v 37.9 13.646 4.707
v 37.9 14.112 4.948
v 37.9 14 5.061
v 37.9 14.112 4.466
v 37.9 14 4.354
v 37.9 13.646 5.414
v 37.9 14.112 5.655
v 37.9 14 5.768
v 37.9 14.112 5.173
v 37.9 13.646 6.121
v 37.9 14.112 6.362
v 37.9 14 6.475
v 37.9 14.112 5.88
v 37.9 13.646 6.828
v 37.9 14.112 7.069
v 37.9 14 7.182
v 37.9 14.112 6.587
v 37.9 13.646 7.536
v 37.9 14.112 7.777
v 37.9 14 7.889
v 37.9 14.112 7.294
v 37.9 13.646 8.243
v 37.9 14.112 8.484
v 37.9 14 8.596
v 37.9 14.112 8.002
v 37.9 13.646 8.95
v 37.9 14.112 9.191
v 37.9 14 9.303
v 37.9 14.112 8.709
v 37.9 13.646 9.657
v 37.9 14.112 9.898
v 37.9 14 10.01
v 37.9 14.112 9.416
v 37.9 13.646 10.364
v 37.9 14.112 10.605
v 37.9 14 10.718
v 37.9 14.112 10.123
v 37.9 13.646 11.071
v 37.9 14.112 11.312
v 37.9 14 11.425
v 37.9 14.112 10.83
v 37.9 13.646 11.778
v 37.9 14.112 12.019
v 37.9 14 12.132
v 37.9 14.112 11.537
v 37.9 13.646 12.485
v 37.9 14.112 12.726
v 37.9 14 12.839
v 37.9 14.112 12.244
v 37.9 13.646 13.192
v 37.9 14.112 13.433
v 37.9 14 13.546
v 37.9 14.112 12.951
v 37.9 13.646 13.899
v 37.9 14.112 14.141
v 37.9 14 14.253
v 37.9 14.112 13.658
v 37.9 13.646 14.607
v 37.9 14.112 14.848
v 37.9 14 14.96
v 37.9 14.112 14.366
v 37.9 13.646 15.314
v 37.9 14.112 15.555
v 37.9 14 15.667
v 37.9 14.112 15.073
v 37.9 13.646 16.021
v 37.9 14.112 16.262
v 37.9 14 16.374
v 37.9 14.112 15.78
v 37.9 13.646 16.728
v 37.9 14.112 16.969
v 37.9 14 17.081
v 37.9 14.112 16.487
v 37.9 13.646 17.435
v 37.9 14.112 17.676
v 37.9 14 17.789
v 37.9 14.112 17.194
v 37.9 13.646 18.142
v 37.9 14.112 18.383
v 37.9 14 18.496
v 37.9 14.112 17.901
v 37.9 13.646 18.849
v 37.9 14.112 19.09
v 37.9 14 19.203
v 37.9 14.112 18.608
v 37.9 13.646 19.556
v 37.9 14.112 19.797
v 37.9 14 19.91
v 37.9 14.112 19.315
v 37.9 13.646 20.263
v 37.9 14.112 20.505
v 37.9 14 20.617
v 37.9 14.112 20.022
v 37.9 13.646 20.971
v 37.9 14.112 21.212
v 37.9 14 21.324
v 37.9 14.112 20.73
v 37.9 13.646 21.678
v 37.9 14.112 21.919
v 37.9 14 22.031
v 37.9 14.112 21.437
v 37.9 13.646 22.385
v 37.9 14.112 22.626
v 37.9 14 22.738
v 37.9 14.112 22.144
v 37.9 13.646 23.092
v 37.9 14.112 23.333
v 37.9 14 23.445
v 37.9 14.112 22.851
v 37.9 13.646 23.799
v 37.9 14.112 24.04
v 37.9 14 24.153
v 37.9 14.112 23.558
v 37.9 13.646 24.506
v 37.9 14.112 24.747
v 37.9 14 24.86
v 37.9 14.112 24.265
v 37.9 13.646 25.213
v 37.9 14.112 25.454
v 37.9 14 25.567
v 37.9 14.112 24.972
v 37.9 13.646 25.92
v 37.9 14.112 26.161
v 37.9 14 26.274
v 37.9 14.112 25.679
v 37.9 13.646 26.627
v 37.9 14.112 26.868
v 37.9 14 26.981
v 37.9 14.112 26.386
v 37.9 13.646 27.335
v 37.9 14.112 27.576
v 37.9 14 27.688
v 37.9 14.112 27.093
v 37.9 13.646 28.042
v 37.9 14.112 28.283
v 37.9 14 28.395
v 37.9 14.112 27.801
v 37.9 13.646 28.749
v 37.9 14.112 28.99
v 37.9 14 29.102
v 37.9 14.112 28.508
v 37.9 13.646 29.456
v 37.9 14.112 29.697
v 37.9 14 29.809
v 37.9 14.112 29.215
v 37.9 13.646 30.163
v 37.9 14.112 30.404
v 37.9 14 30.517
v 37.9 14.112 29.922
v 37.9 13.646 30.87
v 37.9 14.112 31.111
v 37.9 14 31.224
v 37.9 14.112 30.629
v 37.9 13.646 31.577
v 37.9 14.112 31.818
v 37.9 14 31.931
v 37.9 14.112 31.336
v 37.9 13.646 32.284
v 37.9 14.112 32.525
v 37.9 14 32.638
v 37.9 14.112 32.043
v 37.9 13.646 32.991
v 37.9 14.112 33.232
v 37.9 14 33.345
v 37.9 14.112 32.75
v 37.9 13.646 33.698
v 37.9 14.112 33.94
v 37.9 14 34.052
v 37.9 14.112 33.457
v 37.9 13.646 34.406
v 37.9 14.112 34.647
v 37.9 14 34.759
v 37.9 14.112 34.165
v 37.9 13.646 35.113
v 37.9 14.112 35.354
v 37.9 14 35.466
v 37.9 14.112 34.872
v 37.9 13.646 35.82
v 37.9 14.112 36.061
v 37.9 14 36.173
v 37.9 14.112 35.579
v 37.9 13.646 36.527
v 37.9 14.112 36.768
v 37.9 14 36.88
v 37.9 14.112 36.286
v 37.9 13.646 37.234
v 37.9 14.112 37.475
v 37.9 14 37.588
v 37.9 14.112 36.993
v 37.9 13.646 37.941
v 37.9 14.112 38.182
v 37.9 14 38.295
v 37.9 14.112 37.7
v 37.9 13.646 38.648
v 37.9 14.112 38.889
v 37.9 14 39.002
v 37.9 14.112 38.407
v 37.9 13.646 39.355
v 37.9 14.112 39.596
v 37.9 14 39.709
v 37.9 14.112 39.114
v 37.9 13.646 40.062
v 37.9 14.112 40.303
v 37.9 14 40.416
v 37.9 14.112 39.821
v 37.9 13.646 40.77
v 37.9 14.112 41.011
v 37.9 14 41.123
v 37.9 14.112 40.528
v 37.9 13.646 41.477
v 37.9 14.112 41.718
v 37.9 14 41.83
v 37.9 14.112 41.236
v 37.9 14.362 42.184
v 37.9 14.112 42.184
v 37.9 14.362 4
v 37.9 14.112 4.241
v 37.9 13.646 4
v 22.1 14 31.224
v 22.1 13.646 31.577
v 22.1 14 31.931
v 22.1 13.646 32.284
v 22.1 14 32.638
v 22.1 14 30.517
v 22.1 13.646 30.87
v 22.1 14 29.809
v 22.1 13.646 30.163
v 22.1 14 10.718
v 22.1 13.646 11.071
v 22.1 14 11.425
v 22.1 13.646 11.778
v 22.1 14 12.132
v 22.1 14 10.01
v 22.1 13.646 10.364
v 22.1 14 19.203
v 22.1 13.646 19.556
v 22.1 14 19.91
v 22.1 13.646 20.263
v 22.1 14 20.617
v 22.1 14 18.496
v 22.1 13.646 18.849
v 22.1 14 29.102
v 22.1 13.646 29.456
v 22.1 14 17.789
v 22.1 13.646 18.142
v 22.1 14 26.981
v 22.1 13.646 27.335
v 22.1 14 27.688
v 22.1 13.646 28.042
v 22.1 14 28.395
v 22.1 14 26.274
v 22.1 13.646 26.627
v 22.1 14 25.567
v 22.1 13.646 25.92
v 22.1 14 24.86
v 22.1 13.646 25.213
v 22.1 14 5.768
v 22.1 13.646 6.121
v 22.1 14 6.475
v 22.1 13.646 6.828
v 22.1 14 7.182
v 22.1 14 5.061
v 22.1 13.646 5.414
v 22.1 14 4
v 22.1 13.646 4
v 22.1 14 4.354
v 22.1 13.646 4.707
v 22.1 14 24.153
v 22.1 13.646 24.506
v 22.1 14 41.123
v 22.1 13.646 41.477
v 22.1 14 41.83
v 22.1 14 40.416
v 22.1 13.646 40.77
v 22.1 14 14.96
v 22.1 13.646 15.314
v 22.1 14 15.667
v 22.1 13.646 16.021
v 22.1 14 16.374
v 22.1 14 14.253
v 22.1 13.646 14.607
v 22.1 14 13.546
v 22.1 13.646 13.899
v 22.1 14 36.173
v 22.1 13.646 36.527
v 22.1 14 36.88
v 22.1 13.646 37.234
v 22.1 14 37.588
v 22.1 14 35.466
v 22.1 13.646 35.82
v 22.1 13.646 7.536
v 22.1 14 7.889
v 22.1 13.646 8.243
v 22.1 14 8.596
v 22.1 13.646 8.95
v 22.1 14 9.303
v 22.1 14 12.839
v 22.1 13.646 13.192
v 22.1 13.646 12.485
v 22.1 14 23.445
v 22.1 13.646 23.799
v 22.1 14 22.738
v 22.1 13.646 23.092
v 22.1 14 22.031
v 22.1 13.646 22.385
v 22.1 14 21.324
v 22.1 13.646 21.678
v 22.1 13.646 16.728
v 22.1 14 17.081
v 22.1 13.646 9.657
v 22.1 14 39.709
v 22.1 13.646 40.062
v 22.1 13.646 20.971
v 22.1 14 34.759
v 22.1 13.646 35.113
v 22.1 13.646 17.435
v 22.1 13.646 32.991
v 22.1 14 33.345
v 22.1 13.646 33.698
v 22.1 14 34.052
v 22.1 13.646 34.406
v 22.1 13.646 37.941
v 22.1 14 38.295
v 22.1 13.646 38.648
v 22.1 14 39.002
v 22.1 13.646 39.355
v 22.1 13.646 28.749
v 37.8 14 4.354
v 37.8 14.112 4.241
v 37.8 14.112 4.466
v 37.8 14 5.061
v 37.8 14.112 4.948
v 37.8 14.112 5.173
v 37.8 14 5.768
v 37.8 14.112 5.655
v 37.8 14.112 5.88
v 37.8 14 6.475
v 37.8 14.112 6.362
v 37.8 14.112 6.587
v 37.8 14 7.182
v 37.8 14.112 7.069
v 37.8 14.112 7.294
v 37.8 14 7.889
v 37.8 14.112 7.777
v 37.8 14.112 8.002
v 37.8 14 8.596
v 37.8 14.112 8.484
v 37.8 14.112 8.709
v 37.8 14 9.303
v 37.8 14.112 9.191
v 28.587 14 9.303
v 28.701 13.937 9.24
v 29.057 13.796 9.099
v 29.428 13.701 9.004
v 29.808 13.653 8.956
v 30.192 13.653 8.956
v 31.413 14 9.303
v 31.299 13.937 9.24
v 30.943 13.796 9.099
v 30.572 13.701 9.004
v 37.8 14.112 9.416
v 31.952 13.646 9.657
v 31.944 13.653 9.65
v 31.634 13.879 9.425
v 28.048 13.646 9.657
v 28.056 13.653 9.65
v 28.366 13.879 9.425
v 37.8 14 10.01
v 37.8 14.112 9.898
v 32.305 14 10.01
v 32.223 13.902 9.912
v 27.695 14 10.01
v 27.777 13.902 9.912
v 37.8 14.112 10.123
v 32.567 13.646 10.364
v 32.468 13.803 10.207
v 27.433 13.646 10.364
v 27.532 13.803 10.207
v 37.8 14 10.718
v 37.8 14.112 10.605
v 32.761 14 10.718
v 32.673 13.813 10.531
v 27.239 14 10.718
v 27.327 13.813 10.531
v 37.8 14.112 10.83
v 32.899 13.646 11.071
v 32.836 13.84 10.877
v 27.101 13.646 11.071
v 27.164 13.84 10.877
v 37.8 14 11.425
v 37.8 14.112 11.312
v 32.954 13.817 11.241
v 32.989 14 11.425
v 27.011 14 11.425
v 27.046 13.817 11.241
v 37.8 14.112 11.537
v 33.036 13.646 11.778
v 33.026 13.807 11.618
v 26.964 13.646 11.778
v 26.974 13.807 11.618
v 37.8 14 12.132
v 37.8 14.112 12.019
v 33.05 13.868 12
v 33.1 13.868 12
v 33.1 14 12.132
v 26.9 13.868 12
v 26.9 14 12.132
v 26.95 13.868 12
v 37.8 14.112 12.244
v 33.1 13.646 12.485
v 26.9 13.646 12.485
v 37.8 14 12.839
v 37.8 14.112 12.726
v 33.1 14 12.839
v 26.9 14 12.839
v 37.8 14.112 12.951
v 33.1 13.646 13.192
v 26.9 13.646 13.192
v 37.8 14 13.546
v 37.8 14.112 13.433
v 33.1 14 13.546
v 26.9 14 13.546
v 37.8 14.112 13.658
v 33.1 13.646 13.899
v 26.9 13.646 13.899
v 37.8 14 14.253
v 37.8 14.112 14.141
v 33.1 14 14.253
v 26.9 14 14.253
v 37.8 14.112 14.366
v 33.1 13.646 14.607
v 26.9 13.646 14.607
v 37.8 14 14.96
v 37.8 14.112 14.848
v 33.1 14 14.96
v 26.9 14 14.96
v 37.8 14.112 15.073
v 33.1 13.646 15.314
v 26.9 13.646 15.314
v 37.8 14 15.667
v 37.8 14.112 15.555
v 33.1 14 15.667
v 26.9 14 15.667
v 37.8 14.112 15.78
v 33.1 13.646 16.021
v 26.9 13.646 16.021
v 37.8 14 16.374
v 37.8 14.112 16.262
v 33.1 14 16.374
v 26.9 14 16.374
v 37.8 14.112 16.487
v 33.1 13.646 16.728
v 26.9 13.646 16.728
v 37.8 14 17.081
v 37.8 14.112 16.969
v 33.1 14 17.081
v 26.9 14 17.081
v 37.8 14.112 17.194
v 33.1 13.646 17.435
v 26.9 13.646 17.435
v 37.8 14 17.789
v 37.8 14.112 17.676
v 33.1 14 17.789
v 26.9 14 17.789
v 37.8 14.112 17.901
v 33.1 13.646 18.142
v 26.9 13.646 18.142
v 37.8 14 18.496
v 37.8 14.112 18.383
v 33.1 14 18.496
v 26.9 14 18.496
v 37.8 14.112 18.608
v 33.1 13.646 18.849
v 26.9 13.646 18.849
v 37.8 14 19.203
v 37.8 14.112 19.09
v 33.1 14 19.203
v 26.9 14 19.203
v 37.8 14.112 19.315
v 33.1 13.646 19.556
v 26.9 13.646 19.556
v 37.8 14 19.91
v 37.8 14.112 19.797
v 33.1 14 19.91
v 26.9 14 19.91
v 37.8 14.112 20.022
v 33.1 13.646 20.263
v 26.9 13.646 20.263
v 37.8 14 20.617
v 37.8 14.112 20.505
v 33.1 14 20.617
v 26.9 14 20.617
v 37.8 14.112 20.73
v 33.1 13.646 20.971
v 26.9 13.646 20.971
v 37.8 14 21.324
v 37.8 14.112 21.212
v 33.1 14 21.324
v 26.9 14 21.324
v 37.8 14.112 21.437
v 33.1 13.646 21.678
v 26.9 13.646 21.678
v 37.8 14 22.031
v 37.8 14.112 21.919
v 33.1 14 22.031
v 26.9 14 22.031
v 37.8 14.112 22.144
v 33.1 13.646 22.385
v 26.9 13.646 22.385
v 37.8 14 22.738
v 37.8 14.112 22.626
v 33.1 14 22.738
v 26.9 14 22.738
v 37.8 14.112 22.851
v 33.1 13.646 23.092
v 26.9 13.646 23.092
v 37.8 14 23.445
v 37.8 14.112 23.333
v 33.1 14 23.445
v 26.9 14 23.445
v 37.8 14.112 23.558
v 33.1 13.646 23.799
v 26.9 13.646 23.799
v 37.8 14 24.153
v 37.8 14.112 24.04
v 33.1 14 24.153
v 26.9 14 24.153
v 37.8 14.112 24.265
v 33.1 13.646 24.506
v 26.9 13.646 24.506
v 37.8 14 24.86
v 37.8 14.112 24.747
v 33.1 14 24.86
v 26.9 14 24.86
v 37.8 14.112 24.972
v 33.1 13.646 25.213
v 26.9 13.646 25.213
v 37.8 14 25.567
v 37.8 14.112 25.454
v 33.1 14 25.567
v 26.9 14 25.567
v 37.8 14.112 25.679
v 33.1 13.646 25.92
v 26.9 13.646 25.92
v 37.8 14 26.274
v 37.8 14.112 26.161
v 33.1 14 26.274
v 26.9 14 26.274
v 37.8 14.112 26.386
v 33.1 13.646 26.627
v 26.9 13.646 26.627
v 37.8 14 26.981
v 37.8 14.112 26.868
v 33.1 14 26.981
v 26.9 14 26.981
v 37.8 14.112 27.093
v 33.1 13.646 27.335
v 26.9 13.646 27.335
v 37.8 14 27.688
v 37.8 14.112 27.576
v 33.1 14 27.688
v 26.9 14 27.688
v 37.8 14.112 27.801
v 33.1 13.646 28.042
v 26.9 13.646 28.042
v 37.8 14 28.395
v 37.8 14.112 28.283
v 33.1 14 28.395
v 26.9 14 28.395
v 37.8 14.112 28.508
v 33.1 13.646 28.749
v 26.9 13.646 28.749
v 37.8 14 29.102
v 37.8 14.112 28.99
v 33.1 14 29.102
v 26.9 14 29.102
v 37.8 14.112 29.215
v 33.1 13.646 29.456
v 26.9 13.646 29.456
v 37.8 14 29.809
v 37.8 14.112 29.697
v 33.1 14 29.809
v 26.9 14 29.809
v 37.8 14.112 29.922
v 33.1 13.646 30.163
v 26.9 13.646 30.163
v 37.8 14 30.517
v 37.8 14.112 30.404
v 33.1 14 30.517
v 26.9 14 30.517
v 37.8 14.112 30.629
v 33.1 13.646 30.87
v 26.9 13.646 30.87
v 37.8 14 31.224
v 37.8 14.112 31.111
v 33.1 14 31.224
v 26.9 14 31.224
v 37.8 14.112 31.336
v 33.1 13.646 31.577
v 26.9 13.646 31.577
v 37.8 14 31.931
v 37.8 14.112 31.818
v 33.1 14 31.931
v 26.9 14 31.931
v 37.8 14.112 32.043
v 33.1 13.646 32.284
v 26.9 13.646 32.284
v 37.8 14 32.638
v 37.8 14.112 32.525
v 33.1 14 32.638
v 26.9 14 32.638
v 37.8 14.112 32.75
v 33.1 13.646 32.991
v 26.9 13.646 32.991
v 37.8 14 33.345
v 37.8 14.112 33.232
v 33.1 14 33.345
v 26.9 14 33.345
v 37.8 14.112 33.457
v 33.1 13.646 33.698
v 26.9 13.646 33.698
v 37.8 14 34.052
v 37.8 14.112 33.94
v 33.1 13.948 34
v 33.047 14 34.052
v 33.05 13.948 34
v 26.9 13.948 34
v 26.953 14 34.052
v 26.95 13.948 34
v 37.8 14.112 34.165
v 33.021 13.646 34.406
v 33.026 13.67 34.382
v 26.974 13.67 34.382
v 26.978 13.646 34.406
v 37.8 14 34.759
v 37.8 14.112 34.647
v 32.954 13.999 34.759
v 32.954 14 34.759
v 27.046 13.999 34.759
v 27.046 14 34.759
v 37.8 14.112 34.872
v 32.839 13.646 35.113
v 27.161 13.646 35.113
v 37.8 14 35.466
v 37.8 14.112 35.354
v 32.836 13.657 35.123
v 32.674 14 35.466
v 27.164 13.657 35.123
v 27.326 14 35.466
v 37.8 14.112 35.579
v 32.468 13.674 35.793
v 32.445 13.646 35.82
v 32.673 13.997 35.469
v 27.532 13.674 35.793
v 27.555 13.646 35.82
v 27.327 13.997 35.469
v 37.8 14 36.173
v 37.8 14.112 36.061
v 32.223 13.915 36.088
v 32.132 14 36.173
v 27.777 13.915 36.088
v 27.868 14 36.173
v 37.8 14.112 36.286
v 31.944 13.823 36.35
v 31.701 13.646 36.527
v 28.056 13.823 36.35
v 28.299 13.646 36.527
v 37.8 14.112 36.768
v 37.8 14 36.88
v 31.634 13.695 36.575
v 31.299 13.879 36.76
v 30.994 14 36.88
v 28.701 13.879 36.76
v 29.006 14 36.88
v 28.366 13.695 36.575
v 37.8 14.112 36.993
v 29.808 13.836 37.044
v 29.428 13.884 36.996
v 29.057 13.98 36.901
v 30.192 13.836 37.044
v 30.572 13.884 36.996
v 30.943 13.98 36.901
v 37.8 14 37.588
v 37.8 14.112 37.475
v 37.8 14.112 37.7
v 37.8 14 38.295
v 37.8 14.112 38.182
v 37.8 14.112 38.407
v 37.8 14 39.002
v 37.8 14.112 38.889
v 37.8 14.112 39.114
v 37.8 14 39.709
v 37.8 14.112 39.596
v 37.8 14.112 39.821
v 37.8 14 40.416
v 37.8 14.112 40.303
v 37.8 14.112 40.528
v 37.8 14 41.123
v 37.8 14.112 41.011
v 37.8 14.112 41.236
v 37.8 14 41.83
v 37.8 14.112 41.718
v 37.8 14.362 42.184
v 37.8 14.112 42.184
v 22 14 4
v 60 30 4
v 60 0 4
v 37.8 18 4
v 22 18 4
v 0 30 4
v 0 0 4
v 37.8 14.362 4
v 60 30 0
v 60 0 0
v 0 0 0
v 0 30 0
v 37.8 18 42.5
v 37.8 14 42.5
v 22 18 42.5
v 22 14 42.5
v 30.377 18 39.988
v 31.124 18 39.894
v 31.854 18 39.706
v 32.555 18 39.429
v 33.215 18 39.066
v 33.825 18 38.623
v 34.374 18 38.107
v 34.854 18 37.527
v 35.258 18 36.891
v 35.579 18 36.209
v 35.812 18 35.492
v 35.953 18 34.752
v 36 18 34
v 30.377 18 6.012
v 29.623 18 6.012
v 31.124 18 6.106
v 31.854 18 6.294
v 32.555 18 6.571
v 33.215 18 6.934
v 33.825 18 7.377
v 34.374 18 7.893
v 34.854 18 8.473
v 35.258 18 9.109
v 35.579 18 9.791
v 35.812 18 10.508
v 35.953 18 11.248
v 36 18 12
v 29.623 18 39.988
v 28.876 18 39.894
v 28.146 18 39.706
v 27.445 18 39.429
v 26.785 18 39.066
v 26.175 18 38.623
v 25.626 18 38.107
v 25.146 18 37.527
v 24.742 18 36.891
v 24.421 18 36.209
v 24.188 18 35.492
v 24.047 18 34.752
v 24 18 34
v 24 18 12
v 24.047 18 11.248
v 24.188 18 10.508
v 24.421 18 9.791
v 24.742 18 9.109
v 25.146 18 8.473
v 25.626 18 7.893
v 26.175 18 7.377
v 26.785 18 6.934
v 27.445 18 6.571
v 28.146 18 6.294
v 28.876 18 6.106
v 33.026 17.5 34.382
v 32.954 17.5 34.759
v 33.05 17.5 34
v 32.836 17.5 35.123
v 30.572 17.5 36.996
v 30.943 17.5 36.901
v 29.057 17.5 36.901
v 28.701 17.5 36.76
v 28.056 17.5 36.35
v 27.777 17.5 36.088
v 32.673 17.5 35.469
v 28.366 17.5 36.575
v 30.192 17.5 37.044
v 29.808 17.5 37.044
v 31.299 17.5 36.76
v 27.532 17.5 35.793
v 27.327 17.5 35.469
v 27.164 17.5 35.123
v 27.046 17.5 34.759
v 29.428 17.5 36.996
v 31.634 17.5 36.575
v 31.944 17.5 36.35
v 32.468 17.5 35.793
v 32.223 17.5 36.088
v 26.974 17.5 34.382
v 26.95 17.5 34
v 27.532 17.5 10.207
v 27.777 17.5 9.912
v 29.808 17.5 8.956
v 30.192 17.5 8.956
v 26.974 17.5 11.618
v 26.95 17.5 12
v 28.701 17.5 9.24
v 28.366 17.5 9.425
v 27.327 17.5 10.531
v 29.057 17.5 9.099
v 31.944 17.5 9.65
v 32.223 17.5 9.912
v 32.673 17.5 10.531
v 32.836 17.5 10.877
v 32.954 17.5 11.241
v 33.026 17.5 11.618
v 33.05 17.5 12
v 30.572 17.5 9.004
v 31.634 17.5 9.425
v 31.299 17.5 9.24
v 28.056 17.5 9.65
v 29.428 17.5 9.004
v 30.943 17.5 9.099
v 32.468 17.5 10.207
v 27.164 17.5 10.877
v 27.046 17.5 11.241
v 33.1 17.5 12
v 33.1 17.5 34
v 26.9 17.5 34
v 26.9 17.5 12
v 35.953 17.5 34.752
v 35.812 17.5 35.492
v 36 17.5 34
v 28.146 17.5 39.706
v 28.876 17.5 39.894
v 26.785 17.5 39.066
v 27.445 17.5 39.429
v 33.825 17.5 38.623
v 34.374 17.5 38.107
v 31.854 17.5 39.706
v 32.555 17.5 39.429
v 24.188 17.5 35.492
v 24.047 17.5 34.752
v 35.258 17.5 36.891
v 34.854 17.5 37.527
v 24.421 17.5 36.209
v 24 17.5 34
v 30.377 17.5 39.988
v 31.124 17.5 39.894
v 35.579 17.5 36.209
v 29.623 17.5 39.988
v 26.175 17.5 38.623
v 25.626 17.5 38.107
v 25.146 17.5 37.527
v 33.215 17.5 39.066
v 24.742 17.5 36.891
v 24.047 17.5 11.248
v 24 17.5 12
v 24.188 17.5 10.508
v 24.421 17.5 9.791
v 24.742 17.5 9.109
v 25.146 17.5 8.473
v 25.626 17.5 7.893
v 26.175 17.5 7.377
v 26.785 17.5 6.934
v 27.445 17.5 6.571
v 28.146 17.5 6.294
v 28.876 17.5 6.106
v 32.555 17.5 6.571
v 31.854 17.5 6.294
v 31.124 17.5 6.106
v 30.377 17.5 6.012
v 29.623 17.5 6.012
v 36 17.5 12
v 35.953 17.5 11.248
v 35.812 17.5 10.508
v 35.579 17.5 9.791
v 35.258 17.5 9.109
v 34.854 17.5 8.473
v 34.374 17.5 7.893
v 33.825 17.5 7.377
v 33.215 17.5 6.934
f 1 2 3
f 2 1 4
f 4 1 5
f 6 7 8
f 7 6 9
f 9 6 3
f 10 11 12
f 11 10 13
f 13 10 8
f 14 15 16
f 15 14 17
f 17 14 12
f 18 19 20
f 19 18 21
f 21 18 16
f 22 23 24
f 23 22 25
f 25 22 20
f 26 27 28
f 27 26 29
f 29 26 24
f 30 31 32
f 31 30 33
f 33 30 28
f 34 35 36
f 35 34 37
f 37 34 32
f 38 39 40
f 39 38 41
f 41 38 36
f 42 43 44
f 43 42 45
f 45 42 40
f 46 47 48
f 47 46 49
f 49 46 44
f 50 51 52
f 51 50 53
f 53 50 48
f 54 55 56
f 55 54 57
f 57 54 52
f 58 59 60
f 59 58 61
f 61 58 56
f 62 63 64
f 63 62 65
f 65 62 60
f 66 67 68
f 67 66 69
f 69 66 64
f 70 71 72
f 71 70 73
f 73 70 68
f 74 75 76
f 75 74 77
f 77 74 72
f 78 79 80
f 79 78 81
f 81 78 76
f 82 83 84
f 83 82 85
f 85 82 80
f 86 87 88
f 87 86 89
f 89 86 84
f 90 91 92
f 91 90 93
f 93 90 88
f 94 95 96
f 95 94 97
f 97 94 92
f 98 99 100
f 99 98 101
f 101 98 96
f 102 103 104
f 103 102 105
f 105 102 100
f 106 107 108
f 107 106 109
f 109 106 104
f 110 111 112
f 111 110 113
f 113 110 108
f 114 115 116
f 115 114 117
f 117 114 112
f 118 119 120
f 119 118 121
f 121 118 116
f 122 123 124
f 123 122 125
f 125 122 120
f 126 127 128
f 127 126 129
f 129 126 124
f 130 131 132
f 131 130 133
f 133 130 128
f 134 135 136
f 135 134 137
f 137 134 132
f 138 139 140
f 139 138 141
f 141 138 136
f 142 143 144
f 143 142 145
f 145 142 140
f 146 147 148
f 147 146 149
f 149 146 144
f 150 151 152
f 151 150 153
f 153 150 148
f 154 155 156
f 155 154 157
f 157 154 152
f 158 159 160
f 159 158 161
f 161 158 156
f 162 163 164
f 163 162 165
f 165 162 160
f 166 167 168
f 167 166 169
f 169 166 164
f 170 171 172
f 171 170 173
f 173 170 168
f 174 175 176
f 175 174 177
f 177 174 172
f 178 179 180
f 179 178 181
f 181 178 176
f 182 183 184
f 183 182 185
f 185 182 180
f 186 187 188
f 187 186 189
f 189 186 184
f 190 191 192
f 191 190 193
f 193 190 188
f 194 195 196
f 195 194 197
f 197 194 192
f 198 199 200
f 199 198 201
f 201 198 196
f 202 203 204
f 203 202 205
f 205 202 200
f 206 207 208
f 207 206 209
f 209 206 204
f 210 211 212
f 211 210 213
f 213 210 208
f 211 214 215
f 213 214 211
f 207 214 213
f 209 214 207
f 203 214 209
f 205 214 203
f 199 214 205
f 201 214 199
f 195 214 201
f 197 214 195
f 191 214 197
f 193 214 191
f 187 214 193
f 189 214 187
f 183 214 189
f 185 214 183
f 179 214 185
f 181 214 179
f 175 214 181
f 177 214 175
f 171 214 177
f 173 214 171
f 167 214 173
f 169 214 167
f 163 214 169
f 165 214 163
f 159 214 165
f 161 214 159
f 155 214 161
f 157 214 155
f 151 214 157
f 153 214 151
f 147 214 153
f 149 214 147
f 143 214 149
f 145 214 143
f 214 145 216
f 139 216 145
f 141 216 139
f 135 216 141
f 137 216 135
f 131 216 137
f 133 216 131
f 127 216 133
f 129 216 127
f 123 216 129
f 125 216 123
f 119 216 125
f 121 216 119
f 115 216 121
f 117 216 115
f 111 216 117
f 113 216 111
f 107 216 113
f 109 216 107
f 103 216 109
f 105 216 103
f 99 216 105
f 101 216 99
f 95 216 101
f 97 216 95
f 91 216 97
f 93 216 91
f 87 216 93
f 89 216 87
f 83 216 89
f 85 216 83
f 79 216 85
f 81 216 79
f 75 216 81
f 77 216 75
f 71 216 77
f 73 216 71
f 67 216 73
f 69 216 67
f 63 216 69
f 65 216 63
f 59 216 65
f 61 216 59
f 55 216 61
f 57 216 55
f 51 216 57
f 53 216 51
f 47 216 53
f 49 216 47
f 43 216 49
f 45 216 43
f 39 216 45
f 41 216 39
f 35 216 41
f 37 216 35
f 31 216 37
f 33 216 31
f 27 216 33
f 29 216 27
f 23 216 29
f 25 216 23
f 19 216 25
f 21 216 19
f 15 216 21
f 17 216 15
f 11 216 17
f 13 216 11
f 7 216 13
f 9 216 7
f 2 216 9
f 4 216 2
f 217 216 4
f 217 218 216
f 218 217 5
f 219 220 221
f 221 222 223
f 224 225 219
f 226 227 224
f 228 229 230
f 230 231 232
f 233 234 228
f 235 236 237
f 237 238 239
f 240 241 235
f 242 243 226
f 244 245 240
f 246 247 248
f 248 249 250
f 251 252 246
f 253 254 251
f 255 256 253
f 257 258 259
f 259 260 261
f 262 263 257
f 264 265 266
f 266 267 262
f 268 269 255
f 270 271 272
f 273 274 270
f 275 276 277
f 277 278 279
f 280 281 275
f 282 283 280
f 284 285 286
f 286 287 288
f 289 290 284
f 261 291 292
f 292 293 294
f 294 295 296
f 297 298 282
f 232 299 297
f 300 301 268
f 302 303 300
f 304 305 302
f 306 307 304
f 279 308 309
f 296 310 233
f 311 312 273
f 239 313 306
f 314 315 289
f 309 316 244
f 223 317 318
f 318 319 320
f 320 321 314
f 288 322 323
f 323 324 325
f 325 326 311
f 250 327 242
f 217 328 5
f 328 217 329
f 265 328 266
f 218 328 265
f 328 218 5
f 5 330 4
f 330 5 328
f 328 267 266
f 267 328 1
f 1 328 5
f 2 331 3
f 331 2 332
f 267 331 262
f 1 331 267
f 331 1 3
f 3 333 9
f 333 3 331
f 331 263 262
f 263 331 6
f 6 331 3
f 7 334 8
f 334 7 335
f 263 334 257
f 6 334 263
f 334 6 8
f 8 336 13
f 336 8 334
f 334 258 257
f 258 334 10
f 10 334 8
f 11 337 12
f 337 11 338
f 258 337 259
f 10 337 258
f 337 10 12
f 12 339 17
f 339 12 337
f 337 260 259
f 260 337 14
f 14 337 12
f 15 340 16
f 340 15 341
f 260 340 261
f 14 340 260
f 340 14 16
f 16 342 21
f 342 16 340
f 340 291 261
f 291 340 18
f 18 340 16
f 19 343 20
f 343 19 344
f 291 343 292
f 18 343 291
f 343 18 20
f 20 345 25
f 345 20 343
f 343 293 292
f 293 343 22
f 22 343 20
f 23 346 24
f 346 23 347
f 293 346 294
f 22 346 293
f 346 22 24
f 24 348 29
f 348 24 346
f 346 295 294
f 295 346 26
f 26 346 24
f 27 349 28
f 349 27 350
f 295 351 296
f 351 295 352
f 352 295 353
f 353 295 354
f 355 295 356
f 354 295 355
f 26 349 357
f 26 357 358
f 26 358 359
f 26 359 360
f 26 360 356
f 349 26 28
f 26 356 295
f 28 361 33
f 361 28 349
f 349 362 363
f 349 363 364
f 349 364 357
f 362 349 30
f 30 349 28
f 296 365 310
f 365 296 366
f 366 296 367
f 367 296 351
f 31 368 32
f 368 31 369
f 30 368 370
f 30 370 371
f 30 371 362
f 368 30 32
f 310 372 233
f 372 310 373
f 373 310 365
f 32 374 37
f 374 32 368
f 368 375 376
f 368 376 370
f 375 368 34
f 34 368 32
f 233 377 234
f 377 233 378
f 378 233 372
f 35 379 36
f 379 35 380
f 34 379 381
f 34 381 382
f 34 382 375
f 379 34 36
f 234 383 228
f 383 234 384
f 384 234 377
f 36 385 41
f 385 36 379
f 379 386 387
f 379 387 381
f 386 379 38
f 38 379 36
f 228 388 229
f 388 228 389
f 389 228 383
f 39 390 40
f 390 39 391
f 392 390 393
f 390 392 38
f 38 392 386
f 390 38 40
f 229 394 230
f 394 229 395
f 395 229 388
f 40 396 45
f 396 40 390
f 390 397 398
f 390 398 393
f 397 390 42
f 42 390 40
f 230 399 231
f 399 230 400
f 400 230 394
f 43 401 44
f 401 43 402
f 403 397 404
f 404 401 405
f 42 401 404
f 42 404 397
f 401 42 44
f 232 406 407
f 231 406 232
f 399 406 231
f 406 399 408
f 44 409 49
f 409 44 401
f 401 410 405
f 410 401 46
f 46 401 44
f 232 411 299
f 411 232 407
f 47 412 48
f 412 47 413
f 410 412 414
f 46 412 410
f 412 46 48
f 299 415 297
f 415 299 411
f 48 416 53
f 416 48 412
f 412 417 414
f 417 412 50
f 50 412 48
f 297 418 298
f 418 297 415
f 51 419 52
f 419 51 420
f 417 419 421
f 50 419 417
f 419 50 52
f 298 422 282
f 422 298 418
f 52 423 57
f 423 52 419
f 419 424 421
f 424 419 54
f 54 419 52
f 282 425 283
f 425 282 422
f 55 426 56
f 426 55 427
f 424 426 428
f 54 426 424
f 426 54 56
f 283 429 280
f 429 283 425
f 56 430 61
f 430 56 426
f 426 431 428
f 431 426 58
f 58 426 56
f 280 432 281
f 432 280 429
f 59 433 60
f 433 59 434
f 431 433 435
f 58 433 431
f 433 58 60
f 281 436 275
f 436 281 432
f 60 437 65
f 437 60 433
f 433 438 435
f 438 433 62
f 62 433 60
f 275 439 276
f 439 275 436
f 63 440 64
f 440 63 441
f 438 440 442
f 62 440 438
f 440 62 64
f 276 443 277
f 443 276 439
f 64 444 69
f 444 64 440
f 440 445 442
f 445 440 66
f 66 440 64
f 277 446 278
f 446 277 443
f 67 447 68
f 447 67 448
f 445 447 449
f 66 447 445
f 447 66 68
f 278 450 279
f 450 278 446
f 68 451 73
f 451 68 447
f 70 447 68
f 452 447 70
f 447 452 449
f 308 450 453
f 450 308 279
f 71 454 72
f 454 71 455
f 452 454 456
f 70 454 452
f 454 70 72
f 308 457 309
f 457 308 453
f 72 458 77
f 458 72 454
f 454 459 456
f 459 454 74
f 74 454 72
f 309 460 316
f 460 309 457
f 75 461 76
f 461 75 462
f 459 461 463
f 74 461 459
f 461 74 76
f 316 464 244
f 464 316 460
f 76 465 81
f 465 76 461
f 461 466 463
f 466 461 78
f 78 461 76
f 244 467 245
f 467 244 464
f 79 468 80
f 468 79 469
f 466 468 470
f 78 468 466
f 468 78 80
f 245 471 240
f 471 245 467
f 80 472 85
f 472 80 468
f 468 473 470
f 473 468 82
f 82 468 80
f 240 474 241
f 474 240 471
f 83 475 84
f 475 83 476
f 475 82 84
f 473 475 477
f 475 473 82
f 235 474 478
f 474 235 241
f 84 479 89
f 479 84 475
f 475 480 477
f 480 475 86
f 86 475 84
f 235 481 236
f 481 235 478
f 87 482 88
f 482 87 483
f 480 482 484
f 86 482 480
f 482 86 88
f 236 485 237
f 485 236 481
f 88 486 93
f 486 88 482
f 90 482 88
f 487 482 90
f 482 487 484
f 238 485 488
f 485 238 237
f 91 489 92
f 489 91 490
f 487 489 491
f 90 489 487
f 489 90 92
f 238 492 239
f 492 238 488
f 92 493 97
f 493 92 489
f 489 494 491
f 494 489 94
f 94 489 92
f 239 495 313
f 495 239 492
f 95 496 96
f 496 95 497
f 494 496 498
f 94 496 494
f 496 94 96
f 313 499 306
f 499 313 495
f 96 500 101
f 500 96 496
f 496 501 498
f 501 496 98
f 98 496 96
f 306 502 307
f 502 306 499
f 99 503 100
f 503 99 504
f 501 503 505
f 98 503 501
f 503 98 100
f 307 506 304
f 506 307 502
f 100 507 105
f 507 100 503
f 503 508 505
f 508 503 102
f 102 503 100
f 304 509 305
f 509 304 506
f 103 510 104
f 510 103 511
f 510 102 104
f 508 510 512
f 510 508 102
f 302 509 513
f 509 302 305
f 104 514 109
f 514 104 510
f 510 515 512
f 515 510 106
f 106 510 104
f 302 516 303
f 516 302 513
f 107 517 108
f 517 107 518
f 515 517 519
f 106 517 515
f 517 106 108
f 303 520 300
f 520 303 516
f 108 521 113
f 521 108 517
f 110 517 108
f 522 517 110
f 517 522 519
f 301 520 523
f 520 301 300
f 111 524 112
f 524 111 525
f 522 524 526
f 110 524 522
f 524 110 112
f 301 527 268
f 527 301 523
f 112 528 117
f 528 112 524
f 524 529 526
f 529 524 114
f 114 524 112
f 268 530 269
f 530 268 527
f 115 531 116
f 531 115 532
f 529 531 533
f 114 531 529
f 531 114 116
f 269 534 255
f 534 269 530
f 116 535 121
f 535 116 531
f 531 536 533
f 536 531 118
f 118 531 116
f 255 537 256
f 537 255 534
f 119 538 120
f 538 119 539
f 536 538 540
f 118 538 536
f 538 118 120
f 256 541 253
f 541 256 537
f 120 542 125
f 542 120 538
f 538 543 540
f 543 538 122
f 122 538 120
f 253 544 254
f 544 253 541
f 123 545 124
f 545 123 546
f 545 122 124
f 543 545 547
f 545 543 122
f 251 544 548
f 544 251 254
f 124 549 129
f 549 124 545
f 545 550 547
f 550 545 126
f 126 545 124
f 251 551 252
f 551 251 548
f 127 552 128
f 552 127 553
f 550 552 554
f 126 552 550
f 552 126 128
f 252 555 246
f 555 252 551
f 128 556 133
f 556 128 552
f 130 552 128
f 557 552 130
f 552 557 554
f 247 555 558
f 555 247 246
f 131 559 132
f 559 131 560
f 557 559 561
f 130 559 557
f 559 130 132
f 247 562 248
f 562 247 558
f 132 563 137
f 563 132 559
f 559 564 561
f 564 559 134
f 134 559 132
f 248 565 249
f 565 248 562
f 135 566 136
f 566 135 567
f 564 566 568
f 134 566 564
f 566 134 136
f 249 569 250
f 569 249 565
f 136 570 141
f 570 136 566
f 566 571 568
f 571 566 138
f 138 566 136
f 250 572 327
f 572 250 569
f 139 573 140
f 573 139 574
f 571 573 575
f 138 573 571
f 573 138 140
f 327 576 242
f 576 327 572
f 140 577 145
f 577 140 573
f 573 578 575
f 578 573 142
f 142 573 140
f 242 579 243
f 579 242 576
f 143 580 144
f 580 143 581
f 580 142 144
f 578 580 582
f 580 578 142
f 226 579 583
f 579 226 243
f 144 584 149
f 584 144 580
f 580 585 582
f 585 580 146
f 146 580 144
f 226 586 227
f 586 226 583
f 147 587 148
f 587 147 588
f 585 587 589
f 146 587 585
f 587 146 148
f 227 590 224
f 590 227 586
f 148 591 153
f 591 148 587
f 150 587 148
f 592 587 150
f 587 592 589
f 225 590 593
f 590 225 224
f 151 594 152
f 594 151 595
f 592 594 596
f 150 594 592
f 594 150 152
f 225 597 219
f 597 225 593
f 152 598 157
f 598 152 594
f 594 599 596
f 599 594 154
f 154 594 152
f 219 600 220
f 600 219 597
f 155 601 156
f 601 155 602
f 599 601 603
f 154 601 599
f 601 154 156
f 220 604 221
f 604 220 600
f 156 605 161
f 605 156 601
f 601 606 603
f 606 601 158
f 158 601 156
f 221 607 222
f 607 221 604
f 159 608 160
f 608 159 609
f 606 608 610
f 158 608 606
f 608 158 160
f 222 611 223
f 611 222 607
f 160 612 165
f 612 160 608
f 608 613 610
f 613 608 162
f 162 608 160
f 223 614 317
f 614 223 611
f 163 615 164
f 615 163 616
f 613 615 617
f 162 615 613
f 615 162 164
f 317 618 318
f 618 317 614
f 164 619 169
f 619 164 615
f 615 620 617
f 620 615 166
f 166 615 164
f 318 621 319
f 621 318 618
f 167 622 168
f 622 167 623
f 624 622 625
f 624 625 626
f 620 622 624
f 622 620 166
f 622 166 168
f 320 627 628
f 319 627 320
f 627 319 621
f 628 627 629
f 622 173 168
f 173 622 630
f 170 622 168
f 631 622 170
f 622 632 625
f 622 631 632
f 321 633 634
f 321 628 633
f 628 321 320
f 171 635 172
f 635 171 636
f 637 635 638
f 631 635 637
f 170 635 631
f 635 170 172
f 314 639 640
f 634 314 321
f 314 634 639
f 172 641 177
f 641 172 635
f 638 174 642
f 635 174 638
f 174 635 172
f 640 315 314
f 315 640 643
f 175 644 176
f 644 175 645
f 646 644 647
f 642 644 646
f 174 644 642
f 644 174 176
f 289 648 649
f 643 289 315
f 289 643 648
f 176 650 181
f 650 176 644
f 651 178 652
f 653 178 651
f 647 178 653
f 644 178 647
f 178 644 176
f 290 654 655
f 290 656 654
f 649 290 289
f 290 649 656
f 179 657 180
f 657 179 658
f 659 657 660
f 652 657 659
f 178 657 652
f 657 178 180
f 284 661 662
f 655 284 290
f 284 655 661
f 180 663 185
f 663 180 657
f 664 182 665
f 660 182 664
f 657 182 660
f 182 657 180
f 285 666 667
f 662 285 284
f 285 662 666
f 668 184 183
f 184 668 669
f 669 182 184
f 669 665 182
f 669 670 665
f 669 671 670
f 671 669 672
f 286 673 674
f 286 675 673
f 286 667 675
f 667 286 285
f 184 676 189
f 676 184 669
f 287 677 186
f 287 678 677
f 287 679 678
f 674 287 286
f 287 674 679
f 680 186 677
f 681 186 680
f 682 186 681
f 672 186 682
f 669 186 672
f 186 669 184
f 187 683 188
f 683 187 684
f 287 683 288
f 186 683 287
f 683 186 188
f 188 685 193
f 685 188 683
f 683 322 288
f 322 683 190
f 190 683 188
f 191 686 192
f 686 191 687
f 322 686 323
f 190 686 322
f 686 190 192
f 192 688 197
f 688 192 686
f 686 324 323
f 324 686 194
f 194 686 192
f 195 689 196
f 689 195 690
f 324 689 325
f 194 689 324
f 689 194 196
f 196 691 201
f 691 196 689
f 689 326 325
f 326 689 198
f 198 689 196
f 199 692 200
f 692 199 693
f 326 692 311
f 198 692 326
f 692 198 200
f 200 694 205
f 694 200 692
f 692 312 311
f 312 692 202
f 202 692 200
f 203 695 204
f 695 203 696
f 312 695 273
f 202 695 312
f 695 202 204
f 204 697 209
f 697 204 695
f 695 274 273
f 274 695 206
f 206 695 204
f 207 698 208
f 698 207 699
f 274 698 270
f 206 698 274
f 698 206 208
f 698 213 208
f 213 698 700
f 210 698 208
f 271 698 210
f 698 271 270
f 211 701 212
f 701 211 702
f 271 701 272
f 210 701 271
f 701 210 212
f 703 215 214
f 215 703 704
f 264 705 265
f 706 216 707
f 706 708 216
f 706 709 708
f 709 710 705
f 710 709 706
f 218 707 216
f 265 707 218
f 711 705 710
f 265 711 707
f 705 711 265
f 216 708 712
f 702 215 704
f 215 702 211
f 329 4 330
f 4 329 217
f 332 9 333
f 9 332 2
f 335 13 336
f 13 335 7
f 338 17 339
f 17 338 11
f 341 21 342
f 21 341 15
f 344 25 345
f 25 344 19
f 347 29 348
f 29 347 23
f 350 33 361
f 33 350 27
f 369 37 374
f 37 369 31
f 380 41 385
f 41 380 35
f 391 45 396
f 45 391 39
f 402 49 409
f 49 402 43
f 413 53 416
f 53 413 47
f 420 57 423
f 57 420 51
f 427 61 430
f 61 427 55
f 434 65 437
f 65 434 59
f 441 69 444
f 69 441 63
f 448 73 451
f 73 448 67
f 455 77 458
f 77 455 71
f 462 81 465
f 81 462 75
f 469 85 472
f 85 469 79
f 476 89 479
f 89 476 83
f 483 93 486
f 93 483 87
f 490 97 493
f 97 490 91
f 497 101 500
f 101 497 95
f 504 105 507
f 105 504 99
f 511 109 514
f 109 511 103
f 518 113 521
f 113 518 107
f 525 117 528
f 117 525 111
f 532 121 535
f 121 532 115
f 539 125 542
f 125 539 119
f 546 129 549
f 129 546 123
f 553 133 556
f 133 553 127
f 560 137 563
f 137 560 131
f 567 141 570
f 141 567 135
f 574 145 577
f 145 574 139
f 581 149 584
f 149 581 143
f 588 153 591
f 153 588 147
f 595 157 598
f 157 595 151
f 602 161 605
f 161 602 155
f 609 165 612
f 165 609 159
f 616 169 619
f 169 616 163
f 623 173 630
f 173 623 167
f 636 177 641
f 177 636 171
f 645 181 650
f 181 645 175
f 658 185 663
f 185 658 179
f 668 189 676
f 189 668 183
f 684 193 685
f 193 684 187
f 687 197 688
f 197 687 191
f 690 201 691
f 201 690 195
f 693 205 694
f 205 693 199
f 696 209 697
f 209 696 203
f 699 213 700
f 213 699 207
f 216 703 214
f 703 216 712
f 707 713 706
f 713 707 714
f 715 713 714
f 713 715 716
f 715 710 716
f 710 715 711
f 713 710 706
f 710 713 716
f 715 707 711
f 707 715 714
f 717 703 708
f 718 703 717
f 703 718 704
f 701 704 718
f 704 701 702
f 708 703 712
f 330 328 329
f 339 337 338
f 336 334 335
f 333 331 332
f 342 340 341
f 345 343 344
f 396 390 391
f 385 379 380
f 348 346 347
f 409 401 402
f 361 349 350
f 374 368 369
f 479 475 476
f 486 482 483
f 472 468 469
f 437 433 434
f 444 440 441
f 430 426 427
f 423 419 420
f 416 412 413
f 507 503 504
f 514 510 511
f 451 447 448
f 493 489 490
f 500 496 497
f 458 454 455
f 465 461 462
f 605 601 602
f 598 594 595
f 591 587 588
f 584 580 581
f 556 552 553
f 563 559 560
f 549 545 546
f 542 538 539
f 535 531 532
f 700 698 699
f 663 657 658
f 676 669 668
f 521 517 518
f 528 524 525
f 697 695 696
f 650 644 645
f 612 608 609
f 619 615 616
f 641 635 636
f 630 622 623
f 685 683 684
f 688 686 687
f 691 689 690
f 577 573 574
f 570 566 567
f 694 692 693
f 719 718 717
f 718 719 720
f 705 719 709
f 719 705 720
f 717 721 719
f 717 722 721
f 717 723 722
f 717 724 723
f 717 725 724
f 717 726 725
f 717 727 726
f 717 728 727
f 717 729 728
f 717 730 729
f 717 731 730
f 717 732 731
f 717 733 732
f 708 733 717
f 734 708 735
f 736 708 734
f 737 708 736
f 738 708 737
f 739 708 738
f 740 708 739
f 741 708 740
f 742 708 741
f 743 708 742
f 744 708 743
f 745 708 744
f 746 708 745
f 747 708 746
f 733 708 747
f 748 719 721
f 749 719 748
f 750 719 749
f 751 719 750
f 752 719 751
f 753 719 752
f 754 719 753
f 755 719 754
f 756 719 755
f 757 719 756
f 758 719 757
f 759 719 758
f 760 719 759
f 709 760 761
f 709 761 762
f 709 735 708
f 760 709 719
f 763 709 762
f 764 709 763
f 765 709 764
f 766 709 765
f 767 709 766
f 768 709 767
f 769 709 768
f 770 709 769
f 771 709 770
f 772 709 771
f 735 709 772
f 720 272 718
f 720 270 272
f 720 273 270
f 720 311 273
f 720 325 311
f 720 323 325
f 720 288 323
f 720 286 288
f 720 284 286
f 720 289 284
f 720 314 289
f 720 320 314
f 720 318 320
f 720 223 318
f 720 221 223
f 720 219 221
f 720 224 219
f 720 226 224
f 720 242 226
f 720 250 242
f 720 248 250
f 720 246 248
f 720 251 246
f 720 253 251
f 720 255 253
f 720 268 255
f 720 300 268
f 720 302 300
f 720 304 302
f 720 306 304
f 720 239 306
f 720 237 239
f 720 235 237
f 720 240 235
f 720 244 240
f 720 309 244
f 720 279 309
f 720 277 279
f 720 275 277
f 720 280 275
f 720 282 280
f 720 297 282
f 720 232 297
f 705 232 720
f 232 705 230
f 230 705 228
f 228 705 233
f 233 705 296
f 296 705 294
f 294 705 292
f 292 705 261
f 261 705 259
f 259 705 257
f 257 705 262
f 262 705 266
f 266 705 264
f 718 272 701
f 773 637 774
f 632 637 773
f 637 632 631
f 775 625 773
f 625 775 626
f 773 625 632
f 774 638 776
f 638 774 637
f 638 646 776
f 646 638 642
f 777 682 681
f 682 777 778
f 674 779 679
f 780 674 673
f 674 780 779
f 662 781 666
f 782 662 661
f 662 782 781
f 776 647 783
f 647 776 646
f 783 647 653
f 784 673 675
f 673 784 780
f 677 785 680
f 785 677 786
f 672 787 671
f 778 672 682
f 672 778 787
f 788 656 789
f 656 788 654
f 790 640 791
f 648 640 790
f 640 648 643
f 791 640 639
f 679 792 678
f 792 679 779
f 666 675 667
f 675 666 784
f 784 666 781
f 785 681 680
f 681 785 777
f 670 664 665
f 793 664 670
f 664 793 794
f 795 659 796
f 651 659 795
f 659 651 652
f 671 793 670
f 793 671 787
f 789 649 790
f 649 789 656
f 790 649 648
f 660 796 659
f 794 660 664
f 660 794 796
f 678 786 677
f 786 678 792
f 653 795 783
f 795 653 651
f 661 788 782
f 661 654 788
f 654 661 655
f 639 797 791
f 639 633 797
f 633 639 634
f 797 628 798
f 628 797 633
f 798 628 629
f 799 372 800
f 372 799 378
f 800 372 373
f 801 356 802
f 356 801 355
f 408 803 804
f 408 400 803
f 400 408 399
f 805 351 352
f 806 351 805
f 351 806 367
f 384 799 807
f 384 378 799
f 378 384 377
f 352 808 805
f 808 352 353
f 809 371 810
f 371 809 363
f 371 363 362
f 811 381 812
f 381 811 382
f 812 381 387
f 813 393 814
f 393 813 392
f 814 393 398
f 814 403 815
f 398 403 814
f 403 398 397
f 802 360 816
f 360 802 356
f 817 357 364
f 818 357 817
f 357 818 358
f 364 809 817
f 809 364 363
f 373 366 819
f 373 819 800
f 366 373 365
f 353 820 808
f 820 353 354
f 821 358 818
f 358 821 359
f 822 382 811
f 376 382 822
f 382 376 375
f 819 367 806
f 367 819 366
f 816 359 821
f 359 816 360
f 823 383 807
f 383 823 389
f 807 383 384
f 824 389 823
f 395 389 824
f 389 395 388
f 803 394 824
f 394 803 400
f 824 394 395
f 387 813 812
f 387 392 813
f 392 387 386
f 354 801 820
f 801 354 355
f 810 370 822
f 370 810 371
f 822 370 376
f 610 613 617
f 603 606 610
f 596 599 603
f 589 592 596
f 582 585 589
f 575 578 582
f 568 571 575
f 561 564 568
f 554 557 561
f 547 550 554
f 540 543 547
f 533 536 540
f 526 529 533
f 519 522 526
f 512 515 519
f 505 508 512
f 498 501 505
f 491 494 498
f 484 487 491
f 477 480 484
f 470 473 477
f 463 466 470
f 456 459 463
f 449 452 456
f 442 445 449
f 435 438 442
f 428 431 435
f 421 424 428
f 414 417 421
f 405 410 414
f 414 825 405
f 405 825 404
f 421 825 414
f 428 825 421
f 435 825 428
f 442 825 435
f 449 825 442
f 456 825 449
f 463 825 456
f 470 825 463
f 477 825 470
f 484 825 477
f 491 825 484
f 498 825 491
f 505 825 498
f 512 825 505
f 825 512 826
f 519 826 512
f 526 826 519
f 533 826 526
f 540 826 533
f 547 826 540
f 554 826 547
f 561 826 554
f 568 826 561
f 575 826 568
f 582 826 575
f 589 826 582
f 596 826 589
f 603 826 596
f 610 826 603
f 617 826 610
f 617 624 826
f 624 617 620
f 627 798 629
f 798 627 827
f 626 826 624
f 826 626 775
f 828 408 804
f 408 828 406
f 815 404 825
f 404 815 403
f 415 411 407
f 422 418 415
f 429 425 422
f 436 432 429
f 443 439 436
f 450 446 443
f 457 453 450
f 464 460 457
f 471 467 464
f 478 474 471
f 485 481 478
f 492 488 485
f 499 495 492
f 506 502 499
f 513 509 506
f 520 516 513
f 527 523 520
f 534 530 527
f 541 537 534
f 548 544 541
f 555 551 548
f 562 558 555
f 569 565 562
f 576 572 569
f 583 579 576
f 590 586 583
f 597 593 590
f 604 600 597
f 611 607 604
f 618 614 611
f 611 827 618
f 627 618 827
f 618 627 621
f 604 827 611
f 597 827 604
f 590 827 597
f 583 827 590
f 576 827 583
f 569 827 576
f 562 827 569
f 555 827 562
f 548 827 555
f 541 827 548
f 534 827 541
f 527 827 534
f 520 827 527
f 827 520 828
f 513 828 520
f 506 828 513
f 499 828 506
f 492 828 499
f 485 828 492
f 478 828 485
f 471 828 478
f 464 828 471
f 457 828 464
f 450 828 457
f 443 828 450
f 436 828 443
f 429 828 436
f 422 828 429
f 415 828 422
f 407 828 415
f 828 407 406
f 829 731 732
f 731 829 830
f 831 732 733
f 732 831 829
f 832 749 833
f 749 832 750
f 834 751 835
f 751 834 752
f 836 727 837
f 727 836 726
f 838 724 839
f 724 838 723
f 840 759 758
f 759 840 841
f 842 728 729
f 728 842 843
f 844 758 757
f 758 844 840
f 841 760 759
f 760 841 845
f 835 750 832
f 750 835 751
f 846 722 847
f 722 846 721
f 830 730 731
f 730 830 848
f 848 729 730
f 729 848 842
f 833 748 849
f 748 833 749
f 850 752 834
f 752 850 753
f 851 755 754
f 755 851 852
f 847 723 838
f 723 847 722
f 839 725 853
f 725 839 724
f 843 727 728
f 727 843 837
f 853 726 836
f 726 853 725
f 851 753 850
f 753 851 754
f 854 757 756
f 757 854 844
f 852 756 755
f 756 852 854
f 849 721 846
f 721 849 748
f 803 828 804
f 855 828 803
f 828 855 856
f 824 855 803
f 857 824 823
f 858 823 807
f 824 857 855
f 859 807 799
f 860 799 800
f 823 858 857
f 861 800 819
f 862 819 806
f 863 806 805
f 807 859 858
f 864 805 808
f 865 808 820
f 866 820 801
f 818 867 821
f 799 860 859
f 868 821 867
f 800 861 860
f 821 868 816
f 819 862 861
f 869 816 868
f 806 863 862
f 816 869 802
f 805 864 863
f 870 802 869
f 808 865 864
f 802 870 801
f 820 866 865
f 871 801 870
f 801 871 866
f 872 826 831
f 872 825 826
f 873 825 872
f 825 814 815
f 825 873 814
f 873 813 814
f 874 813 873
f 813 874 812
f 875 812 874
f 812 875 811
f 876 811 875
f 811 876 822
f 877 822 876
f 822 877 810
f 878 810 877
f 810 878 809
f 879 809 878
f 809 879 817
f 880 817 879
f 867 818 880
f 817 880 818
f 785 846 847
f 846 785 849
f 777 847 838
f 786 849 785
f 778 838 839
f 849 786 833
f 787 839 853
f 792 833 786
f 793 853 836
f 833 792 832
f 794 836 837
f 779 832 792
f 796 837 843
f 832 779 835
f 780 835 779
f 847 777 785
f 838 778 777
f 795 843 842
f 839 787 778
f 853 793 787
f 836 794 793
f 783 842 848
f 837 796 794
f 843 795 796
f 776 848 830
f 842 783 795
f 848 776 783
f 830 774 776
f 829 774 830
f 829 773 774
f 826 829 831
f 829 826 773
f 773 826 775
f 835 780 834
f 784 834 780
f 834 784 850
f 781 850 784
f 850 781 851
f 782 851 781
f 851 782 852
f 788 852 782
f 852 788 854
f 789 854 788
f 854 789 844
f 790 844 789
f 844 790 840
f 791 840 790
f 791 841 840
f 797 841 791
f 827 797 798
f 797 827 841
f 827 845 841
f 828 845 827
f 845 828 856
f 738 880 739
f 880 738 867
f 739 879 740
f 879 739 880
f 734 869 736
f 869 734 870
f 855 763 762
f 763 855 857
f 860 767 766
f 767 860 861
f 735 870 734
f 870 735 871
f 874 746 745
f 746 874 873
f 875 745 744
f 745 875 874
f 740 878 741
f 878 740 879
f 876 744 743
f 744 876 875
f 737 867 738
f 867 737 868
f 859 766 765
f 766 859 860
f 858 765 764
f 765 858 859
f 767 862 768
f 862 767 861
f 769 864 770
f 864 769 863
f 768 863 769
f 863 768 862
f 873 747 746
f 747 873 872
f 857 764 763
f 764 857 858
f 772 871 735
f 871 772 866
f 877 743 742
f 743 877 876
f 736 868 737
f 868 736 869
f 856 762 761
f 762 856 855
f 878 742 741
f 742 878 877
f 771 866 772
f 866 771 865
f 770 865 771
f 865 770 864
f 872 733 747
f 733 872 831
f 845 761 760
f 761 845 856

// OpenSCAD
// file: serrated45_plane.scad
// serration using cubes




module serrated45_plane (pitch, length, width) {
    union () {
        for(i = [0:(length - 1)]) {
            translate([i * cos(45), 0, 0])
            rotate([0,0,45])
            cube( [pitch, pitch, width], center = true);
        }
    }
    {
        plane_length = pitch * cos(45) * 2 * length;
        translate([plane_length/2, - pitch/2 * 0.95, 0])
        cube([plane_length, pitch/2, width], center = true);
    }
}


// serrated45_plane (0.5, 80, 18);
// main file
include <serrated45_plane.scad>;

// GPU brace - TOP
// NO plate mounts
// 
// printing
// - 0.1 precision, gradual infill - does not work
//   0.06 precision, 80% infile - 


base_width = 30;
base_length = 60;
base_thickness = 4;
// flat base

// M6 mounting - by mistake
mating_screw_dia = 6;
mating_washer_dia = 12;

$fn = 50;



difference () {
    {
    union () {
        // flat base
        cube([base_length, base_width, base_thickness], center = false);
        

        
        // center
        translate([base_length/2 - 8,base_width/2 - 1,base_thickness])
        cube([16 - 0.2,4,38.5], center = false);        
        
        // serration
        translate([base_length/2, base_width/2 - 1, base_thickness])
        rotate([180,-90,0])
        serrated45_plane(0.5, 54, 16 -0.2);
        }
    }
    {

        

    translate([base_length/2, base_width/2, 34])
    rotate([90,0,0])
    cylinder(r =  mating_screw_dia/2 + 0.05, h = 6, center = true);
        
    translate([base_length/2, base_width/2, 12])
    rotate([90,0,0])
    cylinder(r = mating_screw_dia/2 + 0.05, h = 6, center = true);
    
    translate([base_length/2, base_width/2, 12 + 22/2])
    cube([(mating_screw_dia + 0.1 + 0.1), 6, 22], center = true);
        
    // washer recess
    translate([base_length/2, base_width/2 + 3, 34])
    rotate([90,0,0])
    cylinder(r =  mating_washer_dia/2, h = 1, center = true);
        
    translate([base_length/2, base_width/2 + 3, 12])
    rotate([90,0,0])
    cylinder(r =  mating_washer_dia/2, h = 1, center = true);
    
    translate([base_length/2, base_width/2 + 3, 12 + 22/2])
    cube([mating_washer_dia, 1, 22], center = true);

    }
}
